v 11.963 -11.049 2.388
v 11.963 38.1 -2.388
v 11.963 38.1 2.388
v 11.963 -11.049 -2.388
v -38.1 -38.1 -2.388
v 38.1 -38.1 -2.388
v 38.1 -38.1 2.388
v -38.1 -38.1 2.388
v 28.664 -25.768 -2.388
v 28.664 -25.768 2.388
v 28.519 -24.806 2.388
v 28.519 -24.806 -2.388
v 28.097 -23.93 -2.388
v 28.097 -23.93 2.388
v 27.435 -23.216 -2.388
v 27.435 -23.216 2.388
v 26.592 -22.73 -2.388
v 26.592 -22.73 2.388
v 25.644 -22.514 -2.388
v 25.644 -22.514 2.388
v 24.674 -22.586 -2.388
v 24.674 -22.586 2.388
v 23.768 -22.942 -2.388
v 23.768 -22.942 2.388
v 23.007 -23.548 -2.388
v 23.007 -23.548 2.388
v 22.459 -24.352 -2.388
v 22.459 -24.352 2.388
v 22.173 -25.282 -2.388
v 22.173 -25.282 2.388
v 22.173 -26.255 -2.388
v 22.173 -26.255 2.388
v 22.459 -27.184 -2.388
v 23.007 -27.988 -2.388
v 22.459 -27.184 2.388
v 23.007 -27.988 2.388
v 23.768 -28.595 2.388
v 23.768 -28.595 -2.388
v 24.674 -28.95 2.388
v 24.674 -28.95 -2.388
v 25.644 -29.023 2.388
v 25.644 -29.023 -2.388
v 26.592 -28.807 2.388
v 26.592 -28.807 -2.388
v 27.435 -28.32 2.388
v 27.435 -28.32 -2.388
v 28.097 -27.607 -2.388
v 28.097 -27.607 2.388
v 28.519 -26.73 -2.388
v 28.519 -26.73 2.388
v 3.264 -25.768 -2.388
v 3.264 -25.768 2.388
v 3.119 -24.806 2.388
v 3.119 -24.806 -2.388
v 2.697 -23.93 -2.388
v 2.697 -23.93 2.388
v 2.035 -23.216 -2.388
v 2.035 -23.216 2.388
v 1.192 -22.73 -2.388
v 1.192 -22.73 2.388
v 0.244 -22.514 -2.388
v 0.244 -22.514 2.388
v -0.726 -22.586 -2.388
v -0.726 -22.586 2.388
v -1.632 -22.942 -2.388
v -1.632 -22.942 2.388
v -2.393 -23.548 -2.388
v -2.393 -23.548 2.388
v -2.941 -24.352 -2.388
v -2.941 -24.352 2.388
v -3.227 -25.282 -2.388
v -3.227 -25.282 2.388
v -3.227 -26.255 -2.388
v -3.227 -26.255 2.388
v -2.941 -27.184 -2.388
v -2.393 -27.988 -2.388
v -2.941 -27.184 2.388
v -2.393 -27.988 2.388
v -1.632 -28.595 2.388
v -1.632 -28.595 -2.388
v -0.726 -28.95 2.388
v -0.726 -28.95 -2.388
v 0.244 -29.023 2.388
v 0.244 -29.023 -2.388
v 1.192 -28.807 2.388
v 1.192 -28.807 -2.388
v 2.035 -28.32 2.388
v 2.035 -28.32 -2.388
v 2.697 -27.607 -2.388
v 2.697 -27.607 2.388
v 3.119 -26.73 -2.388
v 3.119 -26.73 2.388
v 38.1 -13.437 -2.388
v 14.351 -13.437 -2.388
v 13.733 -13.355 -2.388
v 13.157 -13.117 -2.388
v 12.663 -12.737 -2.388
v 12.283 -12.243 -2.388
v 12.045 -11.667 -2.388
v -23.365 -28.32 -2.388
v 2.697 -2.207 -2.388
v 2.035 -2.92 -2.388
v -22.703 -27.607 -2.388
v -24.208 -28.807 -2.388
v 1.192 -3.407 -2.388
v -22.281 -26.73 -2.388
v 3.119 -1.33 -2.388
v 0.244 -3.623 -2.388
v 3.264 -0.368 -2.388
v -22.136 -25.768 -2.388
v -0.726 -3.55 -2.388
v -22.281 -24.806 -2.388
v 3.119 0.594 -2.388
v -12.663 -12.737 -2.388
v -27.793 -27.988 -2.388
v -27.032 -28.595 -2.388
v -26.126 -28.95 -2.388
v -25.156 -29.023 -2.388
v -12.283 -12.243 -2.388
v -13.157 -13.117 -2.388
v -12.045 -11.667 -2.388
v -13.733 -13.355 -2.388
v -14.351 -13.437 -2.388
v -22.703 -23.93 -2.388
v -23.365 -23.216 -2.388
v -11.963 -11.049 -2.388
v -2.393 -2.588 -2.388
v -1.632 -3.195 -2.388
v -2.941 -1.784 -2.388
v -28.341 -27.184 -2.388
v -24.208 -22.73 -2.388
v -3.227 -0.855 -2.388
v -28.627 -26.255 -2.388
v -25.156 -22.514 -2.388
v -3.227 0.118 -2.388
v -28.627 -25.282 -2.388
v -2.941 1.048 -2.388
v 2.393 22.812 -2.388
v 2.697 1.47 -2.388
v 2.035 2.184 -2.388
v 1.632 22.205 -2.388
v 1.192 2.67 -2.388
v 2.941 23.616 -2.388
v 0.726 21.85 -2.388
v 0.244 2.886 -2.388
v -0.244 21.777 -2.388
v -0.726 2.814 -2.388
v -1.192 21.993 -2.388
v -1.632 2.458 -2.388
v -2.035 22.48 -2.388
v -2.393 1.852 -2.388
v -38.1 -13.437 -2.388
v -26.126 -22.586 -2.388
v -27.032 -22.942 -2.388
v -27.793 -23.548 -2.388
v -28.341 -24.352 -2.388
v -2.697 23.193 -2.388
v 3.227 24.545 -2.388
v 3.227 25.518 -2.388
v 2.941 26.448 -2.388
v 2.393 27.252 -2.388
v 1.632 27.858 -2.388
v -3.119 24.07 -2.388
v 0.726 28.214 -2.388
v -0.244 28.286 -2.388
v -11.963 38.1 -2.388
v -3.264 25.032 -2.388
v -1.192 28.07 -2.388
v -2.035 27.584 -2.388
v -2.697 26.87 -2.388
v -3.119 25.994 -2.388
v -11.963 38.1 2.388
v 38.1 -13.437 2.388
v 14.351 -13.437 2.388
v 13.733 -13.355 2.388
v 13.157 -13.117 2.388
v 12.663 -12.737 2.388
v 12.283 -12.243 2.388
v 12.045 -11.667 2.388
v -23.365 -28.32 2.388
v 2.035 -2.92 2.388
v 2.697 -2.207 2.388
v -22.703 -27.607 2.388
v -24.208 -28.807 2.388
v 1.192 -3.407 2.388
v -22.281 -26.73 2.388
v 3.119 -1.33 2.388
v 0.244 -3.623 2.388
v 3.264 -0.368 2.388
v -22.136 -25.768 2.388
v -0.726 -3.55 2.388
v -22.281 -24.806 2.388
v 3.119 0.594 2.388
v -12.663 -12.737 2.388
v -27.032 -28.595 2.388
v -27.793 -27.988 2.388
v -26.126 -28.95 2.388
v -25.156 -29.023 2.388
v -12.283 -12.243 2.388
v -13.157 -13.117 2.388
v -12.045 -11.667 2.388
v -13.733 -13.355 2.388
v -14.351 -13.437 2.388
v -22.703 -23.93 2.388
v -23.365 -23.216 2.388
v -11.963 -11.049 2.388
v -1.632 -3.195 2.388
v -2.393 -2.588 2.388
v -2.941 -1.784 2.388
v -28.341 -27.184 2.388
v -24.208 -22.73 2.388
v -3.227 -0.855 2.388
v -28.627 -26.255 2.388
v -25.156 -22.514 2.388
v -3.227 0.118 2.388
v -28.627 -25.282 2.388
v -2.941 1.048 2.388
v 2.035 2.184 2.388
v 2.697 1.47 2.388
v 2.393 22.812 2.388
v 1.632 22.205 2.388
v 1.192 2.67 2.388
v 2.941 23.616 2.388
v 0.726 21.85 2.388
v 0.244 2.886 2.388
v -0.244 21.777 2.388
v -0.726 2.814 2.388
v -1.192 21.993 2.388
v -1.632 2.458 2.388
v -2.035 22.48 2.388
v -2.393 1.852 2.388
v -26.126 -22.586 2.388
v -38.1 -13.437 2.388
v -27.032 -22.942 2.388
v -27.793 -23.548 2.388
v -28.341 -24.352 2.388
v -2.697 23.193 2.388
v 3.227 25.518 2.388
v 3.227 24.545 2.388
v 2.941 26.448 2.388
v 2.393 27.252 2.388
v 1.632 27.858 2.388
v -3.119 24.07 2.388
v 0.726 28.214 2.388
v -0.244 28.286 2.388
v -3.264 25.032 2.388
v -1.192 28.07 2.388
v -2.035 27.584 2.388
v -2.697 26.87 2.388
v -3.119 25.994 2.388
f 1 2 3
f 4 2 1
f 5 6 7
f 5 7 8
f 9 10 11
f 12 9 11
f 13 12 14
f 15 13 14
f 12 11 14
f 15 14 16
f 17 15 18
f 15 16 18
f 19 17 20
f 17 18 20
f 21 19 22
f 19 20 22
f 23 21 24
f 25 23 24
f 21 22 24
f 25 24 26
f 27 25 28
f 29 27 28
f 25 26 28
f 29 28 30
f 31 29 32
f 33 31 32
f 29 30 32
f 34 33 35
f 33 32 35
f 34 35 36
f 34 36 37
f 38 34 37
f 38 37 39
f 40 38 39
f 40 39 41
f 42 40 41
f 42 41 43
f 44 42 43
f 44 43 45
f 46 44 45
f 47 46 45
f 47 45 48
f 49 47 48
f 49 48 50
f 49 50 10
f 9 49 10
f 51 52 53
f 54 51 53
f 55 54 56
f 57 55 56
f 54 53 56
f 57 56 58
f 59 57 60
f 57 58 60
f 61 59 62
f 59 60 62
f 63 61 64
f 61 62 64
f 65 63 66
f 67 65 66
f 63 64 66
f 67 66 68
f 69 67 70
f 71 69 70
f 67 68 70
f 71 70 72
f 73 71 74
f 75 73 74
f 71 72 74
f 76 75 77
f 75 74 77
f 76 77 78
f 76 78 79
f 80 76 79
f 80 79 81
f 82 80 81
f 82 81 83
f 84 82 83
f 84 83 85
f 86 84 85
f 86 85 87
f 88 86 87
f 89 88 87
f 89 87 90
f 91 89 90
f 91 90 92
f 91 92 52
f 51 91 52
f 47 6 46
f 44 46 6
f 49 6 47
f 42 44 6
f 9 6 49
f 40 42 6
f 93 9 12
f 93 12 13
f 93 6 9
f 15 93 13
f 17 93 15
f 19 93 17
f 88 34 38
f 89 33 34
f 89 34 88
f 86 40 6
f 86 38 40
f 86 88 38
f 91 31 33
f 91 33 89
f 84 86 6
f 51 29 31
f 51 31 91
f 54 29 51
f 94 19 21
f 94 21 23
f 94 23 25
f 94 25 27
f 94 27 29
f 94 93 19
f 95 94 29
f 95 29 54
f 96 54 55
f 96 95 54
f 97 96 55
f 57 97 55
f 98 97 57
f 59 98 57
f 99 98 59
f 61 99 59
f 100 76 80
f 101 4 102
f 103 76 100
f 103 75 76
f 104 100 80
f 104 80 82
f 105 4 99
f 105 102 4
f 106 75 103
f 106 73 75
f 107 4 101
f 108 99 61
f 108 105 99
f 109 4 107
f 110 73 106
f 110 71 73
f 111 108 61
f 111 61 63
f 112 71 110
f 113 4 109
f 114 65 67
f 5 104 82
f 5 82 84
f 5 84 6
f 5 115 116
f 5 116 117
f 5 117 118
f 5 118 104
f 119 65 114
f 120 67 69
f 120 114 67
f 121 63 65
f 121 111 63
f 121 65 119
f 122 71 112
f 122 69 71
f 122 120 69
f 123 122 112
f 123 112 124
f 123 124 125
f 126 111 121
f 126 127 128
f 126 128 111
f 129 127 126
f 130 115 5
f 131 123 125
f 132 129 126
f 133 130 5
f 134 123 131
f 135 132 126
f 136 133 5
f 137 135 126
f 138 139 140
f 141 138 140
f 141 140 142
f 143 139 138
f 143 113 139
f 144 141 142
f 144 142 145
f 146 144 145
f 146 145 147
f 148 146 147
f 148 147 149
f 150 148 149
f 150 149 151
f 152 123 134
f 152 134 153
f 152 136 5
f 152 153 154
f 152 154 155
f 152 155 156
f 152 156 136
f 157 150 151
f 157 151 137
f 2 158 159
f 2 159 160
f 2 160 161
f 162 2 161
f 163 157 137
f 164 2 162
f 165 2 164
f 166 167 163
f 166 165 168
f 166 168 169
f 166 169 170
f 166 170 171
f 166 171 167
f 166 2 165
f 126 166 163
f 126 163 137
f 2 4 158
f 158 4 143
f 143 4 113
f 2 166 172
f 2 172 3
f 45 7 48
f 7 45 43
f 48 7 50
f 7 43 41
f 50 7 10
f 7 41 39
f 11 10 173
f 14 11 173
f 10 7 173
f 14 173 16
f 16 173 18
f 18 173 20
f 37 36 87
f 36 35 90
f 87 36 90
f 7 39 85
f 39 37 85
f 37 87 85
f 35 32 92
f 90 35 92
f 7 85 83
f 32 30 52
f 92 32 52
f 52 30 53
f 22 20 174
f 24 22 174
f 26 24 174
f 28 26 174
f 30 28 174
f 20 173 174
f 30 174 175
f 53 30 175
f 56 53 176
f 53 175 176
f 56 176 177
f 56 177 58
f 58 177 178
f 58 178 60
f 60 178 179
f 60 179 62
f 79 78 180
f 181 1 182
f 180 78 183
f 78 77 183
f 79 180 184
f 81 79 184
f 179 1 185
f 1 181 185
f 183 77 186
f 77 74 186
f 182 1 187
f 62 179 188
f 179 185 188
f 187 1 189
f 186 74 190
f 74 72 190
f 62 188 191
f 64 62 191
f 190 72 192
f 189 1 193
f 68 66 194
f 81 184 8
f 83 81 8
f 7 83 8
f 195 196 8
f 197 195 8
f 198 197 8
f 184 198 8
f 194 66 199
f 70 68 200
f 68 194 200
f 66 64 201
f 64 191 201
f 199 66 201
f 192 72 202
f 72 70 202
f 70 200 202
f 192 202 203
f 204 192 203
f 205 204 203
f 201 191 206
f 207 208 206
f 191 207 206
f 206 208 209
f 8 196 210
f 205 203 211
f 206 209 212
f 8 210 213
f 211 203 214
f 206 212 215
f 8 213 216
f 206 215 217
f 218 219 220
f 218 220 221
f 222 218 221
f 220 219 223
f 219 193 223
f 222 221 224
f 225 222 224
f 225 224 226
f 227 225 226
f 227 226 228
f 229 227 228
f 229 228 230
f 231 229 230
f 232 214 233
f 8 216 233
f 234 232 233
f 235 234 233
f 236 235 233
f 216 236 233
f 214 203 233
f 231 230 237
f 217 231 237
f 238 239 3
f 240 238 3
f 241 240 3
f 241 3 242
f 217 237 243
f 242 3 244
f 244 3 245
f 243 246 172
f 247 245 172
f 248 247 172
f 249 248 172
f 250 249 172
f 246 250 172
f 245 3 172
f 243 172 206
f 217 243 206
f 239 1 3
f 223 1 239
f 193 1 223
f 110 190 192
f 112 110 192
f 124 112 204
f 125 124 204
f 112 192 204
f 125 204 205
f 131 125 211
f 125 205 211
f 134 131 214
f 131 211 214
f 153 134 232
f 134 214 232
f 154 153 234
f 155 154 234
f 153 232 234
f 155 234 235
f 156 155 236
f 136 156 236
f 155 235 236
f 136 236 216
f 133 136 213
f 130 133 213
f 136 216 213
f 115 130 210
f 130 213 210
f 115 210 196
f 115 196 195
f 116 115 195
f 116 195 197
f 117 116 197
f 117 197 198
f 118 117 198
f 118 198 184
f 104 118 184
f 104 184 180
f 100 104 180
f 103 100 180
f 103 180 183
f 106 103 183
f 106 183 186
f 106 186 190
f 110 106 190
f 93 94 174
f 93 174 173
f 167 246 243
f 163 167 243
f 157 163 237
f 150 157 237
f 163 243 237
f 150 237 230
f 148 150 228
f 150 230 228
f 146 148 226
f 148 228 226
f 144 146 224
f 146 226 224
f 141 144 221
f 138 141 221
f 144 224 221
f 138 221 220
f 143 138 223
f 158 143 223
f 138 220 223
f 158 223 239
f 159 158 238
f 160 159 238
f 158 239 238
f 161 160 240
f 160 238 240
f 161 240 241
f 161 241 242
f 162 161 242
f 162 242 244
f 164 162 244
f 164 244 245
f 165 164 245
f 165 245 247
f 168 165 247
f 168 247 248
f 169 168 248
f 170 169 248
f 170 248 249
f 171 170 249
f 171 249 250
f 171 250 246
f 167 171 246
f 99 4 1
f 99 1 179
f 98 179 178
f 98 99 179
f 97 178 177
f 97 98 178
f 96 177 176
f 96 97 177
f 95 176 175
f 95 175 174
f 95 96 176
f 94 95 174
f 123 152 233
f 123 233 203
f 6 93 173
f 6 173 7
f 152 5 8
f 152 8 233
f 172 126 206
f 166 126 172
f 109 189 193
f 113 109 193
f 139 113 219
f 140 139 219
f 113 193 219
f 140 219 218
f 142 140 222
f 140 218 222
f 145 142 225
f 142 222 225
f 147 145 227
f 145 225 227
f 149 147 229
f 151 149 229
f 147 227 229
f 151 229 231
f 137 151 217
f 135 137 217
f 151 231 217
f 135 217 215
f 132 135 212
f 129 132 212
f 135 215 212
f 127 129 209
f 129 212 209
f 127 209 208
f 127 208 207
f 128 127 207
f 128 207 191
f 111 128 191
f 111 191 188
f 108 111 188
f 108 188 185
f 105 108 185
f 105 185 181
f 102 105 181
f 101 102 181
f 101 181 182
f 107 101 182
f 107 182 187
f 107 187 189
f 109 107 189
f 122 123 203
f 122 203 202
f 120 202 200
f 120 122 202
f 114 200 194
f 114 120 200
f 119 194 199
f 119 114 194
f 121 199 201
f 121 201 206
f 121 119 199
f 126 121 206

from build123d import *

# Parameters (mm, degrees)
BOSS_EXTRUDE1_DEPTH      = 2.3876
BOSS_EXTRUDE1_DEPTH_BACK = 2.3876
SKETCH4_R                = 3.2639
CUT_EXTRUDE1_DEPTH       = 55.092721646


with BuildPart() as part:
    # Sketch3 → Boss-Extrude1 (new, two sides: drawn at the far end of the back side and taken through both)
    with BuildSketch(Plane.XY.offset(-BOSS_EXTRUDE1_DEPTH_BACK)):
        with BuildLine():
            Line((38.1, -38.1), (-38.1, -38.1))
            Line((-38.1, -38.1), (-38.1, -13.4366))
            Line((-38.1, -13.4366), (-14.351, -13.4366))
            ThreePointArc((-14.351, -13.4366), (-12.662711849, -12.737288151), (-11.9634, -11.049))
            Line((-11.9634, -11.049), (-11.9634, 38.1))
            Line((-11.9634, 38.1), (11.9634, 38.1))
            Line((11.9634, 38.1), (11.9634, -11.049))
            ThreePointArc((11.9634, -11.049), (12.662711849, -12.737288151), (14.351, -13.4366))
            Line((14.351, -13.4366), (38.1, -13.4366))
            Line((38.1, -13.4366), (38.1, -38.1))
        make_face()
    extrude(amount=BOSS_EXTRUDE1_DEPTH + BOSS_EXTRUDE1_DEPTH_BACK)

    # Sketch4 → Cut-Extrude1 (cut, through all)
    with BuildSketch(Plane.XY.offset(2.3876)):
        with Locations((25.4, -25.7683)):
            Circle(SKETCH4_R)
        with Locations((0, -25.7683)):
            Circle(SKETCH4_R)
        with Locations((-25.4, -25.7683)):
            Circle(SKETCH4_R)
        with Locations((0, -0.3683)):
            Circle(SKETCH4_R)
        with Locations(Location((0, 25.0317, 0), (0, 0, 180))):
            Circle(SKETCH4_R)
    extrude(amount=-CUT_EXTRUDE1_DEPTH, mode=Mode.SUBTRACT)


solid = part.part
